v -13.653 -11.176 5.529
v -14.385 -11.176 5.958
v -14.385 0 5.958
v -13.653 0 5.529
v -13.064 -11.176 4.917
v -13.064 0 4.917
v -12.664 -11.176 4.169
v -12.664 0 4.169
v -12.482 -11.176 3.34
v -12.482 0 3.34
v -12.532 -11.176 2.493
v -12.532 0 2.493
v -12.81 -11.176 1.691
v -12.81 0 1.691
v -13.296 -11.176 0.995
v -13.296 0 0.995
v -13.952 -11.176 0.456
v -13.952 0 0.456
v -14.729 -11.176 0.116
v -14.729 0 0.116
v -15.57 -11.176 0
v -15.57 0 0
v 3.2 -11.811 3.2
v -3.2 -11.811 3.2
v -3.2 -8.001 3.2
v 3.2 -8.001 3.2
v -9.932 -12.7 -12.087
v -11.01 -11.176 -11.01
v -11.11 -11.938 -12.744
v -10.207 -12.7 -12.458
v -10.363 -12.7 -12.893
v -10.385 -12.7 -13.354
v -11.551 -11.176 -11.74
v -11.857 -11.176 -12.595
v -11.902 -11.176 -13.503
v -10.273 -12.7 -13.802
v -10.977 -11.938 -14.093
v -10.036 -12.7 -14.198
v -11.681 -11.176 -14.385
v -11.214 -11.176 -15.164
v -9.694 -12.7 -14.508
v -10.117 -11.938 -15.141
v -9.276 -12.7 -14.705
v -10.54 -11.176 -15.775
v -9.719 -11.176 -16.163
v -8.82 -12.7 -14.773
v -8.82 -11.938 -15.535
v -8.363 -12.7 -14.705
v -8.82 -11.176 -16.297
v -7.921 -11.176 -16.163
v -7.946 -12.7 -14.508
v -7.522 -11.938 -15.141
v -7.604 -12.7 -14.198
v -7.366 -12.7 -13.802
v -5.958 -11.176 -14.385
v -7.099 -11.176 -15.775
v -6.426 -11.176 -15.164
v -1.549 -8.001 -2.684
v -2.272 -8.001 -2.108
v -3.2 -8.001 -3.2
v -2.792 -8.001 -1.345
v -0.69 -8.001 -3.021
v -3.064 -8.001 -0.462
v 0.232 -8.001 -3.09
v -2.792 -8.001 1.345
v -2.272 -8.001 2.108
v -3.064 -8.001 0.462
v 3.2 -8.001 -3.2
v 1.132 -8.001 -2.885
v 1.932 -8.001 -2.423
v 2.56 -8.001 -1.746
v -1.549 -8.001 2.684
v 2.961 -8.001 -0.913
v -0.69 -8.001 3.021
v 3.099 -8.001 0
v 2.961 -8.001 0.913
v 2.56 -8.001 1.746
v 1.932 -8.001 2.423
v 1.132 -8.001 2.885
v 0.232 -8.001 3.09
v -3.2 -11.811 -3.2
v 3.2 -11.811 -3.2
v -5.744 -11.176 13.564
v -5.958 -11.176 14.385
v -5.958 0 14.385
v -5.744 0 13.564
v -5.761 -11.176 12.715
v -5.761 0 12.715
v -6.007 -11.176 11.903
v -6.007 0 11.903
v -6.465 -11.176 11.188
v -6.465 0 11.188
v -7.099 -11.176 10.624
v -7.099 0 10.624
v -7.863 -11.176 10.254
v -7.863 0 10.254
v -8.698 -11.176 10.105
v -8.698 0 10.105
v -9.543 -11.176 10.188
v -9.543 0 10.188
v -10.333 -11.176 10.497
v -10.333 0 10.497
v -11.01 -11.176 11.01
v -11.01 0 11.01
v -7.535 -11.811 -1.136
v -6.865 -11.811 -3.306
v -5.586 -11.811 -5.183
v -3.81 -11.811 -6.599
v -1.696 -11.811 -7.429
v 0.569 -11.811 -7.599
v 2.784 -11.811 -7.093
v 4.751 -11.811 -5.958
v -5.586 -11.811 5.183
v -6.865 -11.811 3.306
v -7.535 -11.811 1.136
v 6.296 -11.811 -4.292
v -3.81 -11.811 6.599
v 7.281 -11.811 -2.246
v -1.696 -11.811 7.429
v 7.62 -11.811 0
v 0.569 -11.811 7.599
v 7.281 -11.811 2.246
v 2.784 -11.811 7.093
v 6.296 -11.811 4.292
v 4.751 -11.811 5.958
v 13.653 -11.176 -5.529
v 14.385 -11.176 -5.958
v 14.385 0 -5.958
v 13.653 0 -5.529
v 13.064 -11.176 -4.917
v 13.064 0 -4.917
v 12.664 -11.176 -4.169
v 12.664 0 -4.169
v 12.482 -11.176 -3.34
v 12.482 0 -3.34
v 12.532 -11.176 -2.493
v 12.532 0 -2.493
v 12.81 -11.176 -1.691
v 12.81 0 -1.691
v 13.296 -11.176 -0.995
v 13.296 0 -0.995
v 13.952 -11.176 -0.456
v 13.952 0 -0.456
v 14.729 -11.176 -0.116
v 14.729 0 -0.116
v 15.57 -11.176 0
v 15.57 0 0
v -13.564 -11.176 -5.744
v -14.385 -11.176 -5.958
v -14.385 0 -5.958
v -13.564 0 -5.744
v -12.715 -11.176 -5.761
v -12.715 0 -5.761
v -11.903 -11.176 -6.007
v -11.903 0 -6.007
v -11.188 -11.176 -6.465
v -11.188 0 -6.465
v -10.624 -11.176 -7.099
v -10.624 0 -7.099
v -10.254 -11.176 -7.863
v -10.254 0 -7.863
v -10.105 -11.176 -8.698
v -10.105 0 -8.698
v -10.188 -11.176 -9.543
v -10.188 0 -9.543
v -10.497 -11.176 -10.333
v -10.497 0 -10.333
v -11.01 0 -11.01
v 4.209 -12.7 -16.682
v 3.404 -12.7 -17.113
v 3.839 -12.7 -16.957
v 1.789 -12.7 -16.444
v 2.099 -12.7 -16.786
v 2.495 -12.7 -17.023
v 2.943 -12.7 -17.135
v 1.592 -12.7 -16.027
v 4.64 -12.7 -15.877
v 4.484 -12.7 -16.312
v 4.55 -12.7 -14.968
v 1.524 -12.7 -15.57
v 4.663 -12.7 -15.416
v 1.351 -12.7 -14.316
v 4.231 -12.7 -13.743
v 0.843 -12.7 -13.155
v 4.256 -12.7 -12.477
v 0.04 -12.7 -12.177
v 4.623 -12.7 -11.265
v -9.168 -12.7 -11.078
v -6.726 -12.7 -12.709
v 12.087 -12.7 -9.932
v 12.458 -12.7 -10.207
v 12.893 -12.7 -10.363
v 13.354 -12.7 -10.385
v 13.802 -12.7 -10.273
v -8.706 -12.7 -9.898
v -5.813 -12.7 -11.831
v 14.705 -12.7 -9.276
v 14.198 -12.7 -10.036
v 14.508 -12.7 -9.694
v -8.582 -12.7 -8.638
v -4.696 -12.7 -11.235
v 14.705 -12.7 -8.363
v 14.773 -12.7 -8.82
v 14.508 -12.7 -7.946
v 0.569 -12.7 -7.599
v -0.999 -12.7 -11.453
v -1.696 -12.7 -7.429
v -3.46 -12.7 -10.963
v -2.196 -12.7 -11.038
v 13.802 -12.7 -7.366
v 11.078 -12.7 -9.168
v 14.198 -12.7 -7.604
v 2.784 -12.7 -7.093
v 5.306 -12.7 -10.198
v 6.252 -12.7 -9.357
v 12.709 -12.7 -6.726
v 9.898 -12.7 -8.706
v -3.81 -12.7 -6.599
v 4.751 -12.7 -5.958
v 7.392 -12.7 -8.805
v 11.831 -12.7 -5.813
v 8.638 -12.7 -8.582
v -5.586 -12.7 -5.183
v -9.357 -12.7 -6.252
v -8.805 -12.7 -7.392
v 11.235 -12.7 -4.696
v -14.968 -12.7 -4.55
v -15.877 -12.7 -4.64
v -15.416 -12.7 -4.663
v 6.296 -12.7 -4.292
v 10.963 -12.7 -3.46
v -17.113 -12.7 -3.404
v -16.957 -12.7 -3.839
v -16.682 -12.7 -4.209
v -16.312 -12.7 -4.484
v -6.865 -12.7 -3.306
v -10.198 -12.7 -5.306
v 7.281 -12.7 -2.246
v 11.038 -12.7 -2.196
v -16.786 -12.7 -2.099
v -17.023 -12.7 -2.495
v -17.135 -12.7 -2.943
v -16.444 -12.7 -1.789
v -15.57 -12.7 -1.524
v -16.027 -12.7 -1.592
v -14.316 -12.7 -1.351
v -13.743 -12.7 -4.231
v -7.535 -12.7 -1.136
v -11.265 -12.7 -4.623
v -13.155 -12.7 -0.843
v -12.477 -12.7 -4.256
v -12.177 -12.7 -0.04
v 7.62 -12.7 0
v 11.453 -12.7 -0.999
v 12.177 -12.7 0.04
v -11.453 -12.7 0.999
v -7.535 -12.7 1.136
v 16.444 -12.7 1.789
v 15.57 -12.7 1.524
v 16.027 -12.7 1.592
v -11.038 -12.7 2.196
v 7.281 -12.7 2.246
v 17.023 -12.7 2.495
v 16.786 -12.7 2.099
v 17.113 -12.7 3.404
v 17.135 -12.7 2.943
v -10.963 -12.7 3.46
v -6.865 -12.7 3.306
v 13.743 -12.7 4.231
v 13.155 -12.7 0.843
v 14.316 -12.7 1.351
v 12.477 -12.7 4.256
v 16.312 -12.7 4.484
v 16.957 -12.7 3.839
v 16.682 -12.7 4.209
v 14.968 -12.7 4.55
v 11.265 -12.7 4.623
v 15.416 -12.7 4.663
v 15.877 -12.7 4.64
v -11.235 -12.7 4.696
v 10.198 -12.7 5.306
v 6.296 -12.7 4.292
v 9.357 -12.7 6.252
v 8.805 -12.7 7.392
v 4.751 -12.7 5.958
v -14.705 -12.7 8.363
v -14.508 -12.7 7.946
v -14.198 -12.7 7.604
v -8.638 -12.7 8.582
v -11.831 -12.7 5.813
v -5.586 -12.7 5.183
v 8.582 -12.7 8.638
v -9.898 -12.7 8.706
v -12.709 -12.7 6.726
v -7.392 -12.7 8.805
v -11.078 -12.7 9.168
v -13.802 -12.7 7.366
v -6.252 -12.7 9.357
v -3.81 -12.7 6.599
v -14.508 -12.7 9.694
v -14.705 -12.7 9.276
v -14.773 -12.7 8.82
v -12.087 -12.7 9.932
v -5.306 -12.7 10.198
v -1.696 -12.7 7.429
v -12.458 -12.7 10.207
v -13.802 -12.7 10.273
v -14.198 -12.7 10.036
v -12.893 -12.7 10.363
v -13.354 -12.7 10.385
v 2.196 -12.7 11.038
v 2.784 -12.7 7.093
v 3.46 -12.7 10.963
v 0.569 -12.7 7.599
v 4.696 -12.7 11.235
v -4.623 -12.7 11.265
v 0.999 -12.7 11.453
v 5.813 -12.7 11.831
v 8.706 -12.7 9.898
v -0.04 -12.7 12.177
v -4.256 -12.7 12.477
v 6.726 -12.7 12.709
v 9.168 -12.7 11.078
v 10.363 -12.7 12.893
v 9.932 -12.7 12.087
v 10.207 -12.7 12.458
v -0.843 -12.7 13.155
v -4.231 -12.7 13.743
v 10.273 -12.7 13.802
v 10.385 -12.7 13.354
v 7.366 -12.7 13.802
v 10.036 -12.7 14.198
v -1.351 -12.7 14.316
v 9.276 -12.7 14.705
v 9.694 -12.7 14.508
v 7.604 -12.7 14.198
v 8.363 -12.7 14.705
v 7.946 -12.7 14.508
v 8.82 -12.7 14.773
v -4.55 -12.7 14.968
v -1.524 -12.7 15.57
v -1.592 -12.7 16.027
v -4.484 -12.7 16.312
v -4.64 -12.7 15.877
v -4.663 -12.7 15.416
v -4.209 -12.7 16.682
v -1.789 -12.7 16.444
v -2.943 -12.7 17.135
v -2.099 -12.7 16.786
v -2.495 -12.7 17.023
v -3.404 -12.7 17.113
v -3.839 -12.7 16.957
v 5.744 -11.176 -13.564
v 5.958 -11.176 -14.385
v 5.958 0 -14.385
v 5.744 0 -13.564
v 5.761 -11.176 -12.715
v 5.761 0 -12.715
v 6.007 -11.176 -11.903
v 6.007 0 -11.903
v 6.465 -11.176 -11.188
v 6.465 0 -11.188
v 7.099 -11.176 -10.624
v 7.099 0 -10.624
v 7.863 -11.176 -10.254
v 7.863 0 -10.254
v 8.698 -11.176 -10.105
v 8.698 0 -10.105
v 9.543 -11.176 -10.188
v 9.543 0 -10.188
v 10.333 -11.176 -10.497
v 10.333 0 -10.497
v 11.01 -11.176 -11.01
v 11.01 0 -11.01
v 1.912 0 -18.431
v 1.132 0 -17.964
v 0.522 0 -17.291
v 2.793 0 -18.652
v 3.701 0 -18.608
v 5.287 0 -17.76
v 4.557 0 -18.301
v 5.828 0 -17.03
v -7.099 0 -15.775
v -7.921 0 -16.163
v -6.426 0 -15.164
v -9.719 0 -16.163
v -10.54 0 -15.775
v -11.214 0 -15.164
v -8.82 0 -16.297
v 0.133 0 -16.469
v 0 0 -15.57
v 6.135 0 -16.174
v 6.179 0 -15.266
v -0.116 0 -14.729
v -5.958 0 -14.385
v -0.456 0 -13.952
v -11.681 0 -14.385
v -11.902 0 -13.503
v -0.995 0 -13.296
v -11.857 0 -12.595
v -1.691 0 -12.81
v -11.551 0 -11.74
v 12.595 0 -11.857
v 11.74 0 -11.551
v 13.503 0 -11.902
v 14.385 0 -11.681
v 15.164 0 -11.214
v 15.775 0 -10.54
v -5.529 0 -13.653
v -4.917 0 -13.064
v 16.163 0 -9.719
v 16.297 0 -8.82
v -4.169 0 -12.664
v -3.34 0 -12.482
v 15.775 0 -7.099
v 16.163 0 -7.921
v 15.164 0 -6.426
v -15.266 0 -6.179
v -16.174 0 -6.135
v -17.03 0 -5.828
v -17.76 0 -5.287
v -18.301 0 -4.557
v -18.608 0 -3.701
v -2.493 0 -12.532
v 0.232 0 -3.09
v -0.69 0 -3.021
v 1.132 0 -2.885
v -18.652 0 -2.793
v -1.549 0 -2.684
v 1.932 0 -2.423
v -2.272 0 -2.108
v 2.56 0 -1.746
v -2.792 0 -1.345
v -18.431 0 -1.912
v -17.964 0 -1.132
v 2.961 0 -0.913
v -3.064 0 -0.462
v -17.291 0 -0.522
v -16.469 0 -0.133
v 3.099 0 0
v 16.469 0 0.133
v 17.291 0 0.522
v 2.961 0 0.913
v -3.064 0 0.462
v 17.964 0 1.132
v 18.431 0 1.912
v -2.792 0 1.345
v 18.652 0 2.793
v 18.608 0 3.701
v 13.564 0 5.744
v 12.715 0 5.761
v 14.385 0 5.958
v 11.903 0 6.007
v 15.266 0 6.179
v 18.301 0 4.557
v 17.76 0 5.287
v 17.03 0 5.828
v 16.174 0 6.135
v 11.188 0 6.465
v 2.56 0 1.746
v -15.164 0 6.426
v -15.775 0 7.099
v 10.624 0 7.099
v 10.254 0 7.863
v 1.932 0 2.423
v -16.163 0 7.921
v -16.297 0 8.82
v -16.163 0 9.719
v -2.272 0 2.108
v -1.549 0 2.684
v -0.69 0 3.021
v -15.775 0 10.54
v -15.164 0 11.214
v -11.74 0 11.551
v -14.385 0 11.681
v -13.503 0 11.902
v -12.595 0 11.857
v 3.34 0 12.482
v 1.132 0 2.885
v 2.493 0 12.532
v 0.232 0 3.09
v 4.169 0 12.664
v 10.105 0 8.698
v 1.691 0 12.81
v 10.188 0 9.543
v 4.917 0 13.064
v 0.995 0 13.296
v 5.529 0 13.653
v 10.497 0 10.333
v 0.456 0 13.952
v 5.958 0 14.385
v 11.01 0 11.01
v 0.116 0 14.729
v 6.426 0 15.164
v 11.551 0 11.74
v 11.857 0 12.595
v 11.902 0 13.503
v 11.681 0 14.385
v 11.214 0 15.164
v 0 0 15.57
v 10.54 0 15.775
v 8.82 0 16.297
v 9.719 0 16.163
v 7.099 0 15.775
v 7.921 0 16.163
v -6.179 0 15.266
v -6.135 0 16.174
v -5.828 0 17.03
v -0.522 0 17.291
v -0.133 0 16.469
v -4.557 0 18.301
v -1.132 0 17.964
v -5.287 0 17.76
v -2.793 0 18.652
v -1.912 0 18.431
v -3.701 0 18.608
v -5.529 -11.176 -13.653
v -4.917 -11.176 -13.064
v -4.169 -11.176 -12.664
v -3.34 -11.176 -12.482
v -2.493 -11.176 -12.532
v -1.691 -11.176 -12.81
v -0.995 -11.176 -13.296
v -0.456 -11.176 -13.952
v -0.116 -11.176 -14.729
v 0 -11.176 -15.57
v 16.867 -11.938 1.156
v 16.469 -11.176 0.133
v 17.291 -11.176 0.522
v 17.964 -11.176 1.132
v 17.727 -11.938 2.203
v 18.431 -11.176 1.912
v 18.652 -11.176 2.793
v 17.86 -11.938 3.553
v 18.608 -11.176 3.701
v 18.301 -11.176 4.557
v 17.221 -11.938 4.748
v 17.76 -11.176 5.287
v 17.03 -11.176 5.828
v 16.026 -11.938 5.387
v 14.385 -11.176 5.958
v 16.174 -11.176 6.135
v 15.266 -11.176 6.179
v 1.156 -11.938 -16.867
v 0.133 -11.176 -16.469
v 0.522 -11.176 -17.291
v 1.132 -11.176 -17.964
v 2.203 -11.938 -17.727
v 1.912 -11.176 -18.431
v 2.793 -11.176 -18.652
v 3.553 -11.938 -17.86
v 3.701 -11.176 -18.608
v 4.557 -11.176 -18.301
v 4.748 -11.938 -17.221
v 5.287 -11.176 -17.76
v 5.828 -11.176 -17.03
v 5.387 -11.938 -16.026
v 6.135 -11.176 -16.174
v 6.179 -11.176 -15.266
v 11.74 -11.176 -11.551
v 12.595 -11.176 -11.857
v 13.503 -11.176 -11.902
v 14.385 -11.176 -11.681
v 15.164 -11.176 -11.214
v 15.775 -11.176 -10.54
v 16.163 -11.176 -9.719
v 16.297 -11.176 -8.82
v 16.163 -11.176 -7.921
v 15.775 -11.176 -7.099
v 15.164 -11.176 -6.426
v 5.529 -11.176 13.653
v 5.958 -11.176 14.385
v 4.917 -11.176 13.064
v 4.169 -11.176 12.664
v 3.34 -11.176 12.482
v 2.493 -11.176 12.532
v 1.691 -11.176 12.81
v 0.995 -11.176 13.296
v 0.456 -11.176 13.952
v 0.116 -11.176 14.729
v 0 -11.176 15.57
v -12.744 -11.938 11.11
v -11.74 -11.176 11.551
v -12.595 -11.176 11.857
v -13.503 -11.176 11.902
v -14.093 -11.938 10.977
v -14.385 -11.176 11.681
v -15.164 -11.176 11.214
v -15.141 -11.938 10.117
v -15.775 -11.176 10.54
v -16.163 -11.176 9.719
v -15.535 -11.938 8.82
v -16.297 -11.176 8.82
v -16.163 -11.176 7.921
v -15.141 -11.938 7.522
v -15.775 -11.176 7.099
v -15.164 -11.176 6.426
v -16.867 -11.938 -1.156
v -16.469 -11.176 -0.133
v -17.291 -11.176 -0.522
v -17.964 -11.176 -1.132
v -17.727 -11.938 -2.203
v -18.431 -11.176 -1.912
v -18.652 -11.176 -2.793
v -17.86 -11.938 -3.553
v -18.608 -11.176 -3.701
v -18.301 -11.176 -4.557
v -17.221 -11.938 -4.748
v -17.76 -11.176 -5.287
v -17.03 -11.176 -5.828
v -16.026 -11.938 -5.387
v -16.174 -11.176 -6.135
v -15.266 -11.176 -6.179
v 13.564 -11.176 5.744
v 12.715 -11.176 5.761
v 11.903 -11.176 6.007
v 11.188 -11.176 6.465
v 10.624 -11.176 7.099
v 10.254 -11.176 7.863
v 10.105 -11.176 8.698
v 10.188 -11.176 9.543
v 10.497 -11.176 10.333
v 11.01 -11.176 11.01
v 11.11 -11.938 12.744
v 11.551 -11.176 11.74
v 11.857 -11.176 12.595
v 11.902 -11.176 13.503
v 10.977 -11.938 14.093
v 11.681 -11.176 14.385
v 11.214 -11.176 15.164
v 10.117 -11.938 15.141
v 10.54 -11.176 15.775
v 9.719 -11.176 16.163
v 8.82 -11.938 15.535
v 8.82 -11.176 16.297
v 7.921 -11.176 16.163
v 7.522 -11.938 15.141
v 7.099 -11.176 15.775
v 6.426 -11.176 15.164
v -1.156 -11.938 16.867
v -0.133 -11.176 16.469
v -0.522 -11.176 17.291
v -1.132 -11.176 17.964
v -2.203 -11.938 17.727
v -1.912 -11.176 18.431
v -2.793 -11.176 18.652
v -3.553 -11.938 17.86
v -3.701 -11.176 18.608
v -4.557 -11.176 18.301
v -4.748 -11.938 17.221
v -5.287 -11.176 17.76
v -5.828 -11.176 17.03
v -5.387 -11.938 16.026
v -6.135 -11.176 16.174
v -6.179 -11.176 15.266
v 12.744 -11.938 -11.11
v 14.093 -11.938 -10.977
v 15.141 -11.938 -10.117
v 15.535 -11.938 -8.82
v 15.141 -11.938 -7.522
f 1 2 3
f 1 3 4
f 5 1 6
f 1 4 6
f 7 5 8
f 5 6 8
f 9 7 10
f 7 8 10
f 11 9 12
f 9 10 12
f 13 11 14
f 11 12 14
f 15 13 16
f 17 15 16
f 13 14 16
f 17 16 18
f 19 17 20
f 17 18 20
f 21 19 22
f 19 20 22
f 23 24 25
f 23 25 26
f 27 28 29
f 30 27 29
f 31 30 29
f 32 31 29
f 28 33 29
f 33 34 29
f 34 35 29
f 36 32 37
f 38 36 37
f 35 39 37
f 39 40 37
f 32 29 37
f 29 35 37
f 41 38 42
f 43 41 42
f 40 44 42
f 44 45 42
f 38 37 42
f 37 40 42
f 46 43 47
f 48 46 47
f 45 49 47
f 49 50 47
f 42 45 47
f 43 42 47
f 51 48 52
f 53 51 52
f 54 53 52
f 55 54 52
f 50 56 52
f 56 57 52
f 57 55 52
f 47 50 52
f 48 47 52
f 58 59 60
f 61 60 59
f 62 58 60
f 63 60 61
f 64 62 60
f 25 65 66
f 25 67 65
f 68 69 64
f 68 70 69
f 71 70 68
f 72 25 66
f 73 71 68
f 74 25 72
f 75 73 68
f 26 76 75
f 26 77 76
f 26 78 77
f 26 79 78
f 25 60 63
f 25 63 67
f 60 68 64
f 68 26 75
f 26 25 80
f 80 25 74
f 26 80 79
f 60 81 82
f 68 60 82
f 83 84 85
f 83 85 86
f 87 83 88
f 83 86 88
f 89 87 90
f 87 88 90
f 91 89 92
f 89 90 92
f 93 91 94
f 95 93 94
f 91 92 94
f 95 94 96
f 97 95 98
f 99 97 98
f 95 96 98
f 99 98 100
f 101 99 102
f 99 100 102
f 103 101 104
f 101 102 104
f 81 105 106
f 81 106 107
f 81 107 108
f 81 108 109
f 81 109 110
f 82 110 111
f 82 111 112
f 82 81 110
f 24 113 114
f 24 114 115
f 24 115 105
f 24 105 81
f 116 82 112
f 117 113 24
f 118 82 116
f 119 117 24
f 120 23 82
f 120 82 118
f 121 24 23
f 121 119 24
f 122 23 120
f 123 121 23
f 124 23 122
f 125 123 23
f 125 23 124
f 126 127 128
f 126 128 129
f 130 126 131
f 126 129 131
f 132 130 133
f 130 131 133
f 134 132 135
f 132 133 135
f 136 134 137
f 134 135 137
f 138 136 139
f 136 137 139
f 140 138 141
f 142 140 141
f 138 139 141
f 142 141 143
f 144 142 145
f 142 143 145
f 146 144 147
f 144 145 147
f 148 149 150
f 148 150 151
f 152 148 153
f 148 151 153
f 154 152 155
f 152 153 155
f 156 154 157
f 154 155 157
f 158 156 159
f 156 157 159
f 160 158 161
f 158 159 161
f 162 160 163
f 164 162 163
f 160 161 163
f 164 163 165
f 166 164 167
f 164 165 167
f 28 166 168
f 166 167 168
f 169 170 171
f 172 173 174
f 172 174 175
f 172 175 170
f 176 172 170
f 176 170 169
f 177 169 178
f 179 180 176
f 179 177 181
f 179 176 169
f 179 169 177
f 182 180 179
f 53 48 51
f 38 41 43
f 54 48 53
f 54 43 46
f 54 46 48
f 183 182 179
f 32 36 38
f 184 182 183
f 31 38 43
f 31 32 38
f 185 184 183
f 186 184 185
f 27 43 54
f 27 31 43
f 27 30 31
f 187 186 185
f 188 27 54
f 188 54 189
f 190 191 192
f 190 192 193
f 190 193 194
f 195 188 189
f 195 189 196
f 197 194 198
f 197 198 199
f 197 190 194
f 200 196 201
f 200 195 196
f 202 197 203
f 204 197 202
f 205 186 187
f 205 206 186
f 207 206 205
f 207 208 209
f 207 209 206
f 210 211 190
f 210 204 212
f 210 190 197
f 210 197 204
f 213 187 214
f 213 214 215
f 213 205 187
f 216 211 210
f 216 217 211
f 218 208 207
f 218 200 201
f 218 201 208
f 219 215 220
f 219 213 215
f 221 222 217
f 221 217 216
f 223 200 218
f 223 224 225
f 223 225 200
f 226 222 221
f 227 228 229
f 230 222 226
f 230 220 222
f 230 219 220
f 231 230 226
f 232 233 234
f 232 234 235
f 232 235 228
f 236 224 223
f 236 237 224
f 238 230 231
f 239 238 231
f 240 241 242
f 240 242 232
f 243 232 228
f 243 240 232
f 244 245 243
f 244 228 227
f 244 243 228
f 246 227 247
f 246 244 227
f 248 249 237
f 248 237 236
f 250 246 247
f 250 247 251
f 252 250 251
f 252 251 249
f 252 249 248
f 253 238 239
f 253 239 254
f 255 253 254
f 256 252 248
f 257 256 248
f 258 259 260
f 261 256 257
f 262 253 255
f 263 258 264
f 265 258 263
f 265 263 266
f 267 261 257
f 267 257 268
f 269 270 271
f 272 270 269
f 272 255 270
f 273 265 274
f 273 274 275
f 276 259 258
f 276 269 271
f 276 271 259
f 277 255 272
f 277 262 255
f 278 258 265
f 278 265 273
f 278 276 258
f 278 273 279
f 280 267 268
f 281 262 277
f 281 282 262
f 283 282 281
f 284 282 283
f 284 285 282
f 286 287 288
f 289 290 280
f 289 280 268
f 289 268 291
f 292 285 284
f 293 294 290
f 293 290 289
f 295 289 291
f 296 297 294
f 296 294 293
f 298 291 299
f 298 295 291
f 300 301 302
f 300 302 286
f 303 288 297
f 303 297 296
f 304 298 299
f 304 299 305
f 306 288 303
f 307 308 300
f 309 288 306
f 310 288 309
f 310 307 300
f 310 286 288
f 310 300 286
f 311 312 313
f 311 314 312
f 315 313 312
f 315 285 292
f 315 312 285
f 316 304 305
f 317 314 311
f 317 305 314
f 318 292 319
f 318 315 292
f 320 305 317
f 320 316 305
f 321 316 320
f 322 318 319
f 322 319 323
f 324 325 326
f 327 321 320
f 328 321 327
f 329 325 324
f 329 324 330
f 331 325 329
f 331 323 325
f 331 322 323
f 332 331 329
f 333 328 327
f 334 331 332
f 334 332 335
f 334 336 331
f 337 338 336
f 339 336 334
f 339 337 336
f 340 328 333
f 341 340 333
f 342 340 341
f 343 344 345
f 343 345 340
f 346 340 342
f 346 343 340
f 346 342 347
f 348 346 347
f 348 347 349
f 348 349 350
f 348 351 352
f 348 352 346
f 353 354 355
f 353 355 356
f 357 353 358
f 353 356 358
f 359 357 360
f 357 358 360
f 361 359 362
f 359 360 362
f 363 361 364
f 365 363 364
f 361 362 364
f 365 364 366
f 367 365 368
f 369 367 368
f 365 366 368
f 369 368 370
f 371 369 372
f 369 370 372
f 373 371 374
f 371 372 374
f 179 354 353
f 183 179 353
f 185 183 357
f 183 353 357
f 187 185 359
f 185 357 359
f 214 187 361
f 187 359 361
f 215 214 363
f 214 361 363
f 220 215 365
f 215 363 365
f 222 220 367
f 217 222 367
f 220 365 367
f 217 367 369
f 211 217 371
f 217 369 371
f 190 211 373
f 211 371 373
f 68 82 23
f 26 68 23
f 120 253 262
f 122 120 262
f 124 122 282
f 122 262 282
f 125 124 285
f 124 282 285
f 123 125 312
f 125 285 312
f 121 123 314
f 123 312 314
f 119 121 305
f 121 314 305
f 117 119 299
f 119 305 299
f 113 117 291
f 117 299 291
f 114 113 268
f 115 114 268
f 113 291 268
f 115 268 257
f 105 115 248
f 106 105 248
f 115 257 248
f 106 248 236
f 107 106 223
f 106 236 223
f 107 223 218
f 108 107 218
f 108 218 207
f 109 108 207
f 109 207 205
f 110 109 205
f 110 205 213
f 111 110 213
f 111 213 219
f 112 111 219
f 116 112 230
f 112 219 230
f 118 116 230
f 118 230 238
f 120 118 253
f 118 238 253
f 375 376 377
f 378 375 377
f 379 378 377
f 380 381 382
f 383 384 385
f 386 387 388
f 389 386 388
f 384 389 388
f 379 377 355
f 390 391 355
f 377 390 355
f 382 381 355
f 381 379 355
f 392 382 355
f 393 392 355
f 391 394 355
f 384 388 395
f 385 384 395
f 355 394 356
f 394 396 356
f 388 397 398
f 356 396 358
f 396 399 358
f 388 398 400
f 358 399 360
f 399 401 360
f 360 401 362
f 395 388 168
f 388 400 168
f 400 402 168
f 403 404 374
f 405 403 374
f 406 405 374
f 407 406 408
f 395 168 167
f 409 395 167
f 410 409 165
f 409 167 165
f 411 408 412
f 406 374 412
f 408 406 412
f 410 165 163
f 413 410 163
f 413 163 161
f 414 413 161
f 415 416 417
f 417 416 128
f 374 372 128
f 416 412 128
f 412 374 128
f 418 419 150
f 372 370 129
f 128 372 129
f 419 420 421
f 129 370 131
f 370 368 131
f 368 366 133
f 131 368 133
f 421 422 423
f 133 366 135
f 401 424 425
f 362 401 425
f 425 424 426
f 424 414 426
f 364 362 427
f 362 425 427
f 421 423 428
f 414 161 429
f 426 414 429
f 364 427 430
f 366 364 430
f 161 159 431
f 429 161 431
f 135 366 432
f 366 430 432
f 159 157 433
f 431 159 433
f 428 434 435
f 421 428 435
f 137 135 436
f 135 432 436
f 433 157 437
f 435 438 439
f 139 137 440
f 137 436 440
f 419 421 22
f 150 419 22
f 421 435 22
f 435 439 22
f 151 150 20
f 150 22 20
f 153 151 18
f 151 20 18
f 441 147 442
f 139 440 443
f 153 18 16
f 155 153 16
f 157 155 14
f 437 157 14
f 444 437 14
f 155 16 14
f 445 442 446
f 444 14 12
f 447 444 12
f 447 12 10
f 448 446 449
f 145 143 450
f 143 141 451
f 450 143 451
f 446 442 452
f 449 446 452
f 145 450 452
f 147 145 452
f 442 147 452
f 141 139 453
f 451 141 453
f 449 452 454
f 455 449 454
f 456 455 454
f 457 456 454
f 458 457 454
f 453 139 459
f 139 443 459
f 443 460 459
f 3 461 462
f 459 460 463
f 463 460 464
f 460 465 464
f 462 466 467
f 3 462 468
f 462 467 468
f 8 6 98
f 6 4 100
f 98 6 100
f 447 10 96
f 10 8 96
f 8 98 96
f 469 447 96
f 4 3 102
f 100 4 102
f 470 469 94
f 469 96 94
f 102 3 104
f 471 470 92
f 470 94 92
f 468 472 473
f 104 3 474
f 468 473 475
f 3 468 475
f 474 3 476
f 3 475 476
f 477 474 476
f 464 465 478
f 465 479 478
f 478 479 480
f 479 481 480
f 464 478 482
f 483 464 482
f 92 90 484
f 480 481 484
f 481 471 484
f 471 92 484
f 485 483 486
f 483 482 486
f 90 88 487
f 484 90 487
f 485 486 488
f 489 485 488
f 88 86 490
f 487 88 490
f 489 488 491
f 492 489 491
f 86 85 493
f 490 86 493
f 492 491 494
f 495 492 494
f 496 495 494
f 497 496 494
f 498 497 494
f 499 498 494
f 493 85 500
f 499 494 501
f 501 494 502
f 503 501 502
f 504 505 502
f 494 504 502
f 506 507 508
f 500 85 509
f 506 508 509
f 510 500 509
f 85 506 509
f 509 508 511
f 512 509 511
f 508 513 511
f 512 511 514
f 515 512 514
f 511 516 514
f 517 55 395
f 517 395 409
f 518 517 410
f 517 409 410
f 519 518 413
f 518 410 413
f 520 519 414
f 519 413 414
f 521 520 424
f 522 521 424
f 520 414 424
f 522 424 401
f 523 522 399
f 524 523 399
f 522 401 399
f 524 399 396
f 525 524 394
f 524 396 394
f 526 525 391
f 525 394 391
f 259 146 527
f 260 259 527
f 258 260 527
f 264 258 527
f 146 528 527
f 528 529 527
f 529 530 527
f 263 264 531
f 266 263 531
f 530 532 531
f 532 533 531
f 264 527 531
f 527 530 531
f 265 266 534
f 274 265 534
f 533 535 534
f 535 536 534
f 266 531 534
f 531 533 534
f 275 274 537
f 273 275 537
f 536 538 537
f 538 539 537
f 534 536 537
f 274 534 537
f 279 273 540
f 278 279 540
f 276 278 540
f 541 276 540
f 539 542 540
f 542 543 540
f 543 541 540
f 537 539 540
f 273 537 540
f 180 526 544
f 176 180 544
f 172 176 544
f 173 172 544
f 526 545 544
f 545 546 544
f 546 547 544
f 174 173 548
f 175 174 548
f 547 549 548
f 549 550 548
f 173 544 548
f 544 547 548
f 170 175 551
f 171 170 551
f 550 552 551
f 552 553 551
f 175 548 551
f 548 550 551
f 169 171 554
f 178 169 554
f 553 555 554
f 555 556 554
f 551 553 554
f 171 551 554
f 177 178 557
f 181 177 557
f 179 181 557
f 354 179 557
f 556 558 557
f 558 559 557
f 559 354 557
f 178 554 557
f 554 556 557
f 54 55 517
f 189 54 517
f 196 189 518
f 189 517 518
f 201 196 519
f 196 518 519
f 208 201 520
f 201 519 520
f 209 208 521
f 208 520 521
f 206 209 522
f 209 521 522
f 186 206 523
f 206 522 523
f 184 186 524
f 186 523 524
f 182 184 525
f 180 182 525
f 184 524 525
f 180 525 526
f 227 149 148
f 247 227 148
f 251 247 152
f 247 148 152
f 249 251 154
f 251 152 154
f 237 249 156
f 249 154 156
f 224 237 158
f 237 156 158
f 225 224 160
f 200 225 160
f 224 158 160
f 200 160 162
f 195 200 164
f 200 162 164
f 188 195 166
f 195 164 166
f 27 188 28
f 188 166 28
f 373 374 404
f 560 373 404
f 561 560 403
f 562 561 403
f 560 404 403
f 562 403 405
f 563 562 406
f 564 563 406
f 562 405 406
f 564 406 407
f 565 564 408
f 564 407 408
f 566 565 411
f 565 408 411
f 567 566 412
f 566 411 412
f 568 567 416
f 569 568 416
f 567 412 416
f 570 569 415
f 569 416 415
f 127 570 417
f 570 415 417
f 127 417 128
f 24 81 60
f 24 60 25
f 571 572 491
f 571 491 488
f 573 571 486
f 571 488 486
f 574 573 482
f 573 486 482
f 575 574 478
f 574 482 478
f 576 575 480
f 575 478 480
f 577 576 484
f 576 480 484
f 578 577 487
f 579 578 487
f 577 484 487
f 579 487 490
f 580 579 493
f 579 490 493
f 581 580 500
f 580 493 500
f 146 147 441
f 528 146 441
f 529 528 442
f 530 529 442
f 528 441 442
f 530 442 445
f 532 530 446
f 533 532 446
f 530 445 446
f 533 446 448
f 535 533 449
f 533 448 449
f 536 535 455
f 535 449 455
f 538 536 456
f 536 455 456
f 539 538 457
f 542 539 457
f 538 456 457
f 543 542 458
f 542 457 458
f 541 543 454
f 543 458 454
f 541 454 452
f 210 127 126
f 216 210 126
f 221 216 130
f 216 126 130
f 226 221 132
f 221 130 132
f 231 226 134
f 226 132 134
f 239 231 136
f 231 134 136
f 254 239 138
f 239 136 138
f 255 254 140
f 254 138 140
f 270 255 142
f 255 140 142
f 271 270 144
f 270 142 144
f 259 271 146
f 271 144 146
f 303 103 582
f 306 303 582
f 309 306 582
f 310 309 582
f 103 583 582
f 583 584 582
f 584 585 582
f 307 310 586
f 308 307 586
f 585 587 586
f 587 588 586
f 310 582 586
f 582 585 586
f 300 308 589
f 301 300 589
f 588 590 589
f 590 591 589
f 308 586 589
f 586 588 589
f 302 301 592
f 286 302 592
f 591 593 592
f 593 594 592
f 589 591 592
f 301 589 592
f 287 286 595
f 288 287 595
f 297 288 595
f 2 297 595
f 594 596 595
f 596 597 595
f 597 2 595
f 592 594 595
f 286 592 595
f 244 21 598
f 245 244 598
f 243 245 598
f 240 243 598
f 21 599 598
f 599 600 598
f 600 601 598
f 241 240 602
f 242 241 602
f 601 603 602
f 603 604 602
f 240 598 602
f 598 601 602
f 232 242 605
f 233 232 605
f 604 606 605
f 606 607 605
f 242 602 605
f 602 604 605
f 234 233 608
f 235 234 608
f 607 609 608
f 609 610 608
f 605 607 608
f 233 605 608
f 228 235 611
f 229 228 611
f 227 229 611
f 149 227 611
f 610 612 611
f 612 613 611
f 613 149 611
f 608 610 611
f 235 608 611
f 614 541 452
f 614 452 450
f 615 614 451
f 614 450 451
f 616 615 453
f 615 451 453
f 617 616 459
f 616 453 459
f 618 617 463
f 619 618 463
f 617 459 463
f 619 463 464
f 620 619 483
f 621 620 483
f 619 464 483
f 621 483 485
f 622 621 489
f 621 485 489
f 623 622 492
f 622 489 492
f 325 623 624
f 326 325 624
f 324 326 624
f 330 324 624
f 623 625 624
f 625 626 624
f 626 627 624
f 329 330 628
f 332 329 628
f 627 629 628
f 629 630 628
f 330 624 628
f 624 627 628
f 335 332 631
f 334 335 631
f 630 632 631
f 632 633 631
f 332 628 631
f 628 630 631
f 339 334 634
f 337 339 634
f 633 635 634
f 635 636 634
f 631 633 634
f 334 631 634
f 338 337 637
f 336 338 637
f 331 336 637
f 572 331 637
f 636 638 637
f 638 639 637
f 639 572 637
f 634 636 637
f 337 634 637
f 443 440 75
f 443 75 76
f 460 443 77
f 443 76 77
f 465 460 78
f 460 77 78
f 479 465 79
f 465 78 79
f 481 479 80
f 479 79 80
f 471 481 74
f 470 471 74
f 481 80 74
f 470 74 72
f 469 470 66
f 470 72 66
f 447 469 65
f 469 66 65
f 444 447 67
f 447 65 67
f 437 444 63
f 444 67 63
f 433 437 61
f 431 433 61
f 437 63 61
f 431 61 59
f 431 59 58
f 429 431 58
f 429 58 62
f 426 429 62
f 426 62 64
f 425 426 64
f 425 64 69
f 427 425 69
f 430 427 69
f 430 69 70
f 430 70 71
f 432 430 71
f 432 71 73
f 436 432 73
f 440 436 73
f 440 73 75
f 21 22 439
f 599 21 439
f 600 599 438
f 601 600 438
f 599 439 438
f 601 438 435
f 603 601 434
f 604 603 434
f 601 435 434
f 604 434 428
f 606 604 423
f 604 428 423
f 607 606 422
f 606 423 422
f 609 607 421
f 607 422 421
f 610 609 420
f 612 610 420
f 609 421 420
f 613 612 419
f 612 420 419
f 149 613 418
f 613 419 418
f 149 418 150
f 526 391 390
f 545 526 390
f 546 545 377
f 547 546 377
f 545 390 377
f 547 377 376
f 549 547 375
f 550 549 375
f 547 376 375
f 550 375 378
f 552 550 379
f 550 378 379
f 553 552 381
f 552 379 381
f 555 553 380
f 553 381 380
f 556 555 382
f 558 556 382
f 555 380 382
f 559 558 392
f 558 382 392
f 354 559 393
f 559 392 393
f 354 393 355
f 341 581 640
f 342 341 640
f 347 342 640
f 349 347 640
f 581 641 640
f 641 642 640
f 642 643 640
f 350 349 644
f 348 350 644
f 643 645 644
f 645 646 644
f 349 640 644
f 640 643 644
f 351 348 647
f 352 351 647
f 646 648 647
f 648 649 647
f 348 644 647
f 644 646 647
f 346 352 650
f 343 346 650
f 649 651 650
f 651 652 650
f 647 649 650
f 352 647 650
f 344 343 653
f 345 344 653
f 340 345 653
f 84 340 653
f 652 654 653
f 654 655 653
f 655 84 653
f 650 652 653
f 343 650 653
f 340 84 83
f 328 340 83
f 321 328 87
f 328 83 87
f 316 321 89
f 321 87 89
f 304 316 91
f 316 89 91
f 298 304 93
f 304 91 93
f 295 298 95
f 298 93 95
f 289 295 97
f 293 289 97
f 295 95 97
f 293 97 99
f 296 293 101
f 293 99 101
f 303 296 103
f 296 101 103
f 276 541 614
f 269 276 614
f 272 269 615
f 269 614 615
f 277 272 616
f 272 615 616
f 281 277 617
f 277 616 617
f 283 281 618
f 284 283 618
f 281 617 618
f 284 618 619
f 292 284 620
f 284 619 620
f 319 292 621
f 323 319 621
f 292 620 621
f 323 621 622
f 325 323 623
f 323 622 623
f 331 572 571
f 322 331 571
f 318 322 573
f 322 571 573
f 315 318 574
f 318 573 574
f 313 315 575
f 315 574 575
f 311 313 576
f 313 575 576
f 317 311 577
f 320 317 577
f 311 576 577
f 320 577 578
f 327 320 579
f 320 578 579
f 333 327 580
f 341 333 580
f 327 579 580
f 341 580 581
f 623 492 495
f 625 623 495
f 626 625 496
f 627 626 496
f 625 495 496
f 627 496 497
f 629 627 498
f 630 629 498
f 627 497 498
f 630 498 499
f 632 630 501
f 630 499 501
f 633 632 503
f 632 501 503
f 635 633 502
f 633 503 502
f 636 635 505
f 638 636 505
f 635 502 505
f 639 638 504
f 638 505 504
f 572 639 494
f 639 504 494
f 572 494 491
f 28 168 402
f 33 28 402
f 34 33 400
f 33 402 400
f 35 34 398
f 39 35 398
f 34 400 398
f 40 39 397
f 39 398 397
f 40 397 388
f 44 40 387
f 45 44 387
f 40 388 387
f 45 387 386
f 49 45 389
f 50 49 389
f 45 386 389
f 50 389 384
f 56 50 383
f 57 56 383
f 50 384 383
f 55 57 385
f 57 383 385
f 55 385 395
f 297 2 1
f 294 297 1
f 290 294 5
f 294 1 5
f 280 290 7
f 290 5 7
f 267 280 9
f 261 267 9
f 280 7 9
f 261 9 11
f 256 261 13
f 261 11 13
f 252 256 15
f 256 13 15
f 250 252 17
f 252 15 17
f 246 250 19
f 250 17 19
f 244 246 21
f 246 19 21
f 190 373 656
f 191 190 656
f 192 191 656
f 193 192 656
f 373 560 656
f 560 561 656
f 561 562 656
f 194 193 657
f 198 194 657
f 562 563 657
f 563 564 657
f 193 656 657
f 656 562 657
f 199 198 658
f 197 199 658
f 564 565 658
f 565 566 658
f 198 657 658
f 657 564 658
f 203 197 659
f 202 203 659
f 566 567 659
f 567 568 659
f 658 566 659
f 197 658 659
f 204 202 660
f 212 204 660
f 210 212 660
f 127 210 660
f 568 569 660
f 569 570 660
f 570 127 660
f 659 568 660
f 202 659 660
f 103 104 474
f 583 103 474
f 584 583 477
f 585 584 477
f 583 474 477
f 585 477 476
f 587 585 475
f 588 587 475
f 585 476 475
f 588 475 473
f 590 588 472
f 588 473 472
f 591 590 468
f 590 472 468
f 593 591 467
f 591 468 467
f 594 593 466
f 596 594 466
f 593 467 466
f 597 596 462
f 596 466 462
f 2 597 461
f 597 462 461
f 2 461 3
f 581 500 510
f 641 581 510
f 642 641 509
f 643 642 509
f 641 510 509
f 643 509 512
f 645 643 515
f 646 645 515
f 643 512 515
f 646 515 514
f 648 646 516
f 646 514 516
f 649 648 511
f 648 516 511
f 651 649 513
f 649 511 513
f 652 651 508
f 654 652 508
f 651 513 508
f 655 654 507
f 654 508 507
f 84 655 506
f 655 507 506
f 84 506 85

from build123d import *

# Parameters (mm, degrees)
F1_DEPTH = 12.7
F2_COUNT = 8
F3_SIZE  = 1.524
F4_R     = 7.62
F5_DEPTH = 0.889
F6_W     = 6.4008
F6_H     = 6.4008
F7_DEPTH = 3.81
F8_R     = 3.0988
F9_DEPTH = 8.002


with BuildPart() as f1:
    # F0 (on Front) → F1 (new body)
    with BuildSketch(Plane.XZ):
        with BuildLine():
            Line((0, 0), (0, 15.5699663264))
            ThreePointArc((0, 15.5699663264), (-3.7012650727, 18.6075160708), (-5.9583681556, 14.3847732109))
            ThreePointArc((-5.9583681556, 14.3847732109), (-7.0990438342, 10.6244696981), (-11.00962894, 11.00962894))
            Line((-11.00962894, 11.00962894), (0, 0))
        make_face()
    extrude(amount=F1_DEPTH)

    # F2: F1 ×8 about axis
    f2_axis = Axis((0, -6.35, 0), (0, 1, 0))


with BuildPart() as f1_1:
    add(f1.part)
    for i in range(1, F2_COUNT):
        add(f1.part.rotate(f2_axis, i * 360 / F2_COUNT))

    # F3
    f3_edges = [f1_1.edges().sort_by_distance(p)[0] for p in [
        (-3.701265, -12.7, 18.607516),
    ]]
    chamfer(f3_edges, length=F3_SIZE)

    # F4 (on face) → F5 (cut)
    with BuildSketch(Plane.XZ.offset(12.7)):
        Circle(F4_R)
    extrude(amount=-F5_DEPTH, mode=Mode.SUBTRACT)

    # F6 (on face) → F7 (cut)
    with BuildSketch(Plane.XZ.offset(11.811)):
        Rectangle(F6_W, F6_H)
    extrude(amount=-F7_DEPTH, mode=Mode.SUBTRACT)

    # F8 (on face) → F9 (cut, through all)
    with BuildSketch(Plane.XZ.offset(8.001)):
        Circle(F8_R)
    extrude(amount=-F9_DEPTH, mode=Mode.SUBTRACT)


solid = f1_1.part
